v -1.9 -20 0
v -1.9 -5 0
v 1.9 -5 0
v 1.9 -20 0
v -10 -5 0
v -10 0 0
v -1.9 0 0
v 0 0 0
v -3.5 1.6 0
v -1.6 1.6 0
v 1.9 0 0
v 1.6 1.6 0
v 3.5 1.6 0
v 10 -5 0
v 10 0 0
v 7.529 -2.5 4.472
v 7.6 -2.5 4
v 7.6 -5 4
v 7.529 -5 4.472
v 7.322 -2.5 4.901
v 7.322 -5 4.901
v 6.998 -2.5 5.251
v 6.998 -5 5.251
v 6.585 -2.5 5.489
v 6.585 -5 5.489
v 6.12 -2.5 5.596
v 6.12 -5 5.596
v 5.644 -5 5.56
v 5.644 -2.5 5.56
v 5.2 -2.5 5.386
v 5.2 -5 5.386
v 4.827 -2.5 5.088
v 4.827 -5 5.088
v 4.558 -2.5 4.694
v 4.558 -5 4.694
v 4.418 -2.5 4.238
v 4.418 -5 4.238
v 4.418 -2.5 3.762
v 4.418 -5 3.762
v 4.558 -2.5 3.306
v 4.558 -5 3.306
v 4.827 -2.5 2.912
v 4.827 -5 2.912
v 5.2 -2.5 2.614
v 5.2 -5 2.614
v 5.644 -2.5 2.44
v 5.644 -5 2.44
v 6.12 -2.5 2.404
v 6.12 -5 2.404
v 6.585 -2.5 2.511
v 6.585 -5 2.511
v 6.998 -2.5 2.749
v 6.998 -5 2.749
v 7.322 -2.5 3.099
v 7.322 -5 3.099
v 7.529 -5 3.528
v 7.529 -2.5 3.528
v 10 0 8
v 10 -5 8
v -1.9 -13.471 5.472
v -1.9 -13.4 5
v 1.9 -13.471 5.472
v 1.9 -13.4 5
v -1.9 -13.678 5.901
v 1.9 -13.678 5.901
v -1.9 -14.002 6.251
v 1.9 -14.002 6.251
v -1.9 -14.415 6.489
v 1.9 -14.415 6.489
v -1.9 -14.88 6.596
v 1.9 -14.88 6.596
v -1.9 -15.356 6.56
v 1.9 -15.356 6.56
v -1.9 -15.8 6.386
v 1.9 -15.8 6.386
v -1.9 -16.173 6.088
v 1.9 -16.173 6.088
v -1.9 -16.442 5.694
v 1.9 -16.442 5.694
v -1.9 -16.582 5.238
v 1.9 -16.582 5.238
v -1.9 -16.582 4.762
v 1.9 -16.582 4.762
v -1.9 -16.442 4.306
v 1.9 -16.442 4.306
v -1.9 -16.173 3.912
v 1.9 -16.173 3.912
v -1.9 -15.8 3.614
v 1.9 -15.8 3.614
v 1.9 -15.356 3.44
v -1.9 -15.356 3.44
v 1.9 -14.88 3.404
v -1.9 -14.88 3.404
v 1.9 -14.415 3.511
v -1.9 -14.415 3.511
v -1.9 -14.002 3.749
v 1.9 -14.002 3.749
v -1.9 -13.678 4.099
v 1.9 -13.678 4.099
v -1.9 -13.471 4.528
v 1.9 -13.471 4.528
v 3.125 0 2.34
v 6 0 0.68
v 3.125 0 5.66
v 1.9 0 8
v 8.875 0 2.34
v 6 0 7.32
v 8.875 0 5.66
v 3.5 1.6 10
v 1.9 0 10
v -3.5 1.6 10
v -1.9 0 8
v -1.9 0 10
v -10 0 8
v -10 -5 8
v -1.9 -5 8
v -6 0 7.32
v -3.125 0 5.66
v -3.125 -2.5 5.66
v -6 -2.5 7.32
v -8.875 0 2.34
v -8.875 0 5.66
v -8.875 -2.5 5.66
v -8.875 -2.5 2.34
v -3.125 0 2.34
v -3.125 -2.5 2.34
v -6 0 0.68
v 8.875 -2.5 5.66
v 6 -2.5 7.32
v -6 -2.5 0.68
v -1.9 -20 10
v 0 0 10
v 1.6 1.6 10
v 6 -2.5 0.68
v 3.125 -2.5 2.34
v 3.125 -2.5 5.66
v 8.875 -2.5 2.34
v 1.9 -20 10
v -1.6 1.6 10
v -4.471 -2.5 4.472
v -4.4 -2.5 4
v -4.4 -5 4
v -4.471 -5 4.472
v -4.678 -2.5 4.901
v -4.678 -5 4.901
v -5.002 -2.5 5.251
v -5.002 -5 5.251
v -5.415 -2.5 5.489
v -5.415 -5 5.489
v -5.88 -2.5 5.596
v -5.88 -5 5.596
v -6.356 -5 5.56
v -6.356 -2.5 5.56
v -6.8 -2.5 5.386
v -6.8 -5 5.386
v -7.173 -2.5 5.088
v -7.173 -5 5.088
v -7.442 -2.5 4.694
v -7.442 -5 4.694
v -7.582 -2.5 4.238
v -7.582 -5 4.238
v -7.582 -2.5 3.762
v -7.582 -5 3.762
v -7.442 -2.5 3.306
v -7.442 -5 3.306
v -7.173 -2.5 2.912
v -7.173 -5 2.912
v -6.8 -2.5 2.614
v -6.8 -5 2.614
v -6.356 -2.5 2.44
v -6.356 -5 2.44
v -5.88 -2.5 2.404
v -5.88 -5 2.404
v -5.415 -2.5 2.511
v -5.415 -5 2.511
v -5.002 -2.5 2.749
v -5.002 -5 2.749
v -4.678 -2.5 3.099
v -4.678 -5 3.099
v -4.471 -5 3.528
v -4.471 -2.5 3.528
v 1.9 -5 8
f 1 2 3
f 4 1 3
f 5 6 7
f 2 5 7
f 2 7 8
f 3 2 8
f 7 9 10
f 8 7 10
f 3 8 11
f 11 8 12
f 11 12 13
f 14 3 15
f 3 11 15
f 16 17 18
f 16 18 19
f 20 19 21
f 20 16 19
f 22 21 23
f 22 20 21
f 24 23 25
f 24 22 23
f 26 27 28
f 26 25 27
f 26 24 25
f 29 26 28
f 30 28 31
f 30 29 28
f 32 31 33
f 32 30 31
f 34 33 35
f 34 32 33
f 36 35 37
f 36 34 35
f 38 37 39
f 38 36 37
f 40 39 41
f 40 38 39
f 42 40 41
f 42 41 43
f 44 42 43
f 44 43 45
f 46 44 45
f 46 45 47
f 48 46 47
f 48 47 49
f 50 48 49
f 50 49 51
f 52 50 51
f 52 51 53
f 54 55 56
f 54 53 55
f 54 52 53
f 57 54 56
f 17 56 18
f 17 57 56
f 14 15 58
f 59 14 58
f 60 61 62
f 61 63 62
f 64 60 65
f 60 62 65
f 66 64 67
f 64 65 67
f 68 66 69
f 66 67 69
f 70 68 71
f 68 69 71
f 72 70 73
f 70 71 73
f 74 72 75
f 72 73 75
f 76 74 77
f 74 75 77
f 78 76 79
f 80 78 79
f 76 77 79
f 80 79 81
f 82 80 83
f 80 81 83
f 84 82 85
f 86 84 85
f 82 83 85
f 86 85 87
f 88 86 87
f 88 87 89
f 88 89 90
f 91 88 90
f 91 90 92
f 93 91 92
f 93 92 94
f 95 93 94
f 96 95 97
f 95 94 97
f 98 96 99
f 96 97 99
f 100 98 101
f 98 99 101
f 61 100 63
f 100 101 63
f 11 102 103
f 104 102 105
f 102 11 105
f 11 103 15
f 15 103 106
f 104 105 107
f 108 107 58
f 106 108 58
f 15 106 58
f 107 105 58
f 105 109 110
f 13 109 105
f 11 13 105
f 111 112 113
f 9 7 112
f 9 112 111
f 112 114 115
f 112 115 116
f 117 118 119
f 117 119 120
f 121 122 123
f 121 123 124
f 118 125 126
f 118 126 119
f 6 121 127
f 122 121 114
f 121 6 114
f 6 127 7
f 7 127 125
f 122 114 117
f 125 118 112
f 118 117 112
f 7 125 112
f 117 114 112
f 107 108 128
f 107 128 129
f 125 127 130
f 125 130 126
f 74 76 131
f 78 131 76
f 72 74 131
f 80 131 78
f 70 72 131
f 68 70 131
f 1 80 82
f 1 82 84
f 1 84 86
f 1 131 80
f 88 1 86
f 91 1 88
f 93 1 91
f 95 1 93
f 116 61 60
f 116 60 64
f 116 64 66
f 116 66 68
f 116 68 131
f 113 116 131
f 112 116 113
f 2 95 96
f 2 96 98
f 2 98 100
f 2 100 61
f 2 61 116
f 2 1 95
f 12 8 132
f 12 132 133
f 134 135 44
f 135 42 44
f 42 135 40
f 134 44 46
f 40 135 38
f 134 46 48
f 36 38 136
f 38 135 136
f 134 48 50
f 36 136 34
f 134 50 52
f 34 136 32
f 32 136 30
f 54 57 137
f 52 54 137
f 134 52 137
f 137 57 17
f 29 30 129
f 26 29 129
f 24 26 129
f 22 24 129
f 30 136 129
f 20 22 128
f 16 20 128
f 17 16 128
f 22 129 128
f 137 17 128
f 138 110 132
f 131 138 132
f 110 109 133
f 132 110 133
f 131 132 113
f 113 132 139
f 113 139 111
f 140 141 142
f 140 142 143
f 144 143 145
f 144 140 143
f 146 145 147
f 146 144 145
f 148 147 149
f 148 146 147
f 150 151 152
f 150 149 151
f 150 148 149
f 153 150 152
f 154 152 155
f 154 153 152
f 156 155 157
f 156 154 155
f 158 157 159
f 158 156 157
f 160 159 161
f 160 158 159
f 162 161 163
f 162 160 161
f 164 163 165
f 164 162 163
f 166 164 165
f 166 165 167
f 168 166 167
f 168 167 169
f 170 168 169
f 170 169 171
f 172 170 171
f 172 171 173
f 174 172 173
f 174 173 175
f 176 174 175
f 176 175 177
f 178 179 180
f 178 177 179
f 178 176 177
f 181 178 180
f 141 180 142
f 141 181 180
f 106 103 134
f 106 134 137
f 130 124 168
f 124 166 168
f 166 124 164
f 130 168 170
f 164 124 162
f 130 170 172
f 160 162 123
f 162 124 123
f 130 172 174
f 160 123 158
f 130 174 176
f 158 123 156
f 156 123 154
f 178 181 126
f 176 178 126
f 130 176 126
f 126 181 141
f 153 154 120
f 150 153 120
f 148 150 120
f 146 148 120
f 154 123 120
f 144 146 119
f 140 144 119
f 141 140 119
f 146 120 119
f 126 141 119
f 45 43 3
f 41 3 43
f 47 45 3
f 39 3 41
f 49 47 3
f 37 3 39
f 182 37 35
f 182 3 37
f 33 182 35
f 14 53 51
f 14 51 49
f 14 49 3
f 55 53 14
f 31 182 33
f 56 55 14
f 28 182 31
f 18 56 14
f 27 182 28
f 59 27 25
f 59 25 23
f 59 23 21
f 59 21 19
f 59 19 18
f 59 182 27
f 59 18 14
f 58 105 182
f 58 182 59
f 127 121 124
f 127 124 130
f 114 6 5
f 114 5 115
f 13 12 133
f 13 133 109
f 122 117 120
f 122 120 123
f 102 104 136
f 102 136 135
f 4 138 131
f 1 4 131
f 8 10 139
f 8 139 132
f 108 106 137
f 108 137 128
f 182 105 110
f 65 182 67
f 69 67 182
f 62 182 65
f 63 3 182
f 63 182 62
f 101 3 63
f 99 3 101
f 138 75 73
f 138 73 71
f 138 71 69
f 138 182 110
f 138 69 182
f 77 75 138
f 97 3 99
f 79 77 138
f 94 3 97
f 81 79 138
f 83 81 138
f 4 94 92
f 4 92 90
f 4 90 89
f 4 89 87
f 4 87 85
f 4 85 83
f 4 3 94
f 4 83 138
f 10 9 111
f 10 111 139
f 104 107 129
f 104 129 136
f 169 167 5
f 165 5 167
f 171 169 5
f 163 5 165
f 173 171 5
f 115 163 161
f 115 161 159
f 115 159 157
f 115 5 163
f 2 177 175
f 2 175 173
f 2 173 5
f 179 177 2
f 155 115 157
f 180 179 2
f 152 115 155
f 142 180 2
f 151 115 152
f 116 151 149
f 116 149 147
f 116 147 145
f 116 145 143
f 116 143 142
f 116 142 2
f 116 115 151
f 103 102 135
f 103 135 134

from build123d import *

# Parameters (mm, degrees)
PAD_DEPTH            = 10
SKETCH_W             = 20
SKETCH_H             = 8
PAD001_DEPTH         = 5
POCKET_DEPTH         = 2.5
SKETCH003_R          = 1.6
POCKET001_DEPTH      = 20.001
SKETCH004_R          = 1.6
POCKET002_DEPTH      = 10.001
POCKET002_DEPTH_BACK = -10.001


with BuildPart() as part:
    # Sketch001 → Pad (new body)
    with BuildSketch(Plane.XY):
        Polygon((-1.9, 0), (-3.5, 1.6), (-1.6, 1.6), (0, 0), (1.6, 1.6), (3.5, 1.6), (1.9, 0), (1.9, -20), (-1.9, -20), align=None)
    extrude(amount=PAD_DEPTH)

    # Sketch → Pad001 (join)
    with BuildSketch(Plane.XZ):
        with Locations((0, 4)):
            Rectangle(SKETCH_W, SKETCH_H)
    extrude(amount=PAD001_DEPTH)

    # Sketch002 → Pocket (cut)
    with BuildSketch(Plane.XZ):
        Polygon((-3.125, 2.340118), (-3.125, 5.659882), (-6, 7.319764), (-8.875, 5.659882), (-8.875, 2.340118), (-6, 0.680236), align=None)
        Polygon((3.125, 2.340118), (6, 0.680236), (8.875, 2.340118), (8.875, 5.659882), (6, 7.319764), (3.125, 5.659882), align=None)
    extrude(amount=POCKET_DEPTH, mode=Mode.SUBTRACT)

    # Sketch003 → Pocket001 (cut, through all)
    with BuildSketch(Plane.XZ):
        with Locations((-6, 4)):
            Circle(SKETCH003_R)
        with Locations((6, 4)):
            Circle(SKETCH003_R)
    extrude(amount=POCKET001_DEPTH, mode=Mode.SUBTRACT)

    # Sketch004 → Pocket002 (cut, two sides)
    with BuildSketch(Plane.YZ) as pocket002_sk:
        with Locations((-15, 5)):
            Circle(SKETCH004_R)
    extrude(amount=-POCKET002_DEPTH, mode=Mode.SUBTRACT)
    extrude(pocket002_sk.sketch, amount=-POCKET002_DEPTH_BACK, mode=Mode.SUBTRACT)


solid = part.part
